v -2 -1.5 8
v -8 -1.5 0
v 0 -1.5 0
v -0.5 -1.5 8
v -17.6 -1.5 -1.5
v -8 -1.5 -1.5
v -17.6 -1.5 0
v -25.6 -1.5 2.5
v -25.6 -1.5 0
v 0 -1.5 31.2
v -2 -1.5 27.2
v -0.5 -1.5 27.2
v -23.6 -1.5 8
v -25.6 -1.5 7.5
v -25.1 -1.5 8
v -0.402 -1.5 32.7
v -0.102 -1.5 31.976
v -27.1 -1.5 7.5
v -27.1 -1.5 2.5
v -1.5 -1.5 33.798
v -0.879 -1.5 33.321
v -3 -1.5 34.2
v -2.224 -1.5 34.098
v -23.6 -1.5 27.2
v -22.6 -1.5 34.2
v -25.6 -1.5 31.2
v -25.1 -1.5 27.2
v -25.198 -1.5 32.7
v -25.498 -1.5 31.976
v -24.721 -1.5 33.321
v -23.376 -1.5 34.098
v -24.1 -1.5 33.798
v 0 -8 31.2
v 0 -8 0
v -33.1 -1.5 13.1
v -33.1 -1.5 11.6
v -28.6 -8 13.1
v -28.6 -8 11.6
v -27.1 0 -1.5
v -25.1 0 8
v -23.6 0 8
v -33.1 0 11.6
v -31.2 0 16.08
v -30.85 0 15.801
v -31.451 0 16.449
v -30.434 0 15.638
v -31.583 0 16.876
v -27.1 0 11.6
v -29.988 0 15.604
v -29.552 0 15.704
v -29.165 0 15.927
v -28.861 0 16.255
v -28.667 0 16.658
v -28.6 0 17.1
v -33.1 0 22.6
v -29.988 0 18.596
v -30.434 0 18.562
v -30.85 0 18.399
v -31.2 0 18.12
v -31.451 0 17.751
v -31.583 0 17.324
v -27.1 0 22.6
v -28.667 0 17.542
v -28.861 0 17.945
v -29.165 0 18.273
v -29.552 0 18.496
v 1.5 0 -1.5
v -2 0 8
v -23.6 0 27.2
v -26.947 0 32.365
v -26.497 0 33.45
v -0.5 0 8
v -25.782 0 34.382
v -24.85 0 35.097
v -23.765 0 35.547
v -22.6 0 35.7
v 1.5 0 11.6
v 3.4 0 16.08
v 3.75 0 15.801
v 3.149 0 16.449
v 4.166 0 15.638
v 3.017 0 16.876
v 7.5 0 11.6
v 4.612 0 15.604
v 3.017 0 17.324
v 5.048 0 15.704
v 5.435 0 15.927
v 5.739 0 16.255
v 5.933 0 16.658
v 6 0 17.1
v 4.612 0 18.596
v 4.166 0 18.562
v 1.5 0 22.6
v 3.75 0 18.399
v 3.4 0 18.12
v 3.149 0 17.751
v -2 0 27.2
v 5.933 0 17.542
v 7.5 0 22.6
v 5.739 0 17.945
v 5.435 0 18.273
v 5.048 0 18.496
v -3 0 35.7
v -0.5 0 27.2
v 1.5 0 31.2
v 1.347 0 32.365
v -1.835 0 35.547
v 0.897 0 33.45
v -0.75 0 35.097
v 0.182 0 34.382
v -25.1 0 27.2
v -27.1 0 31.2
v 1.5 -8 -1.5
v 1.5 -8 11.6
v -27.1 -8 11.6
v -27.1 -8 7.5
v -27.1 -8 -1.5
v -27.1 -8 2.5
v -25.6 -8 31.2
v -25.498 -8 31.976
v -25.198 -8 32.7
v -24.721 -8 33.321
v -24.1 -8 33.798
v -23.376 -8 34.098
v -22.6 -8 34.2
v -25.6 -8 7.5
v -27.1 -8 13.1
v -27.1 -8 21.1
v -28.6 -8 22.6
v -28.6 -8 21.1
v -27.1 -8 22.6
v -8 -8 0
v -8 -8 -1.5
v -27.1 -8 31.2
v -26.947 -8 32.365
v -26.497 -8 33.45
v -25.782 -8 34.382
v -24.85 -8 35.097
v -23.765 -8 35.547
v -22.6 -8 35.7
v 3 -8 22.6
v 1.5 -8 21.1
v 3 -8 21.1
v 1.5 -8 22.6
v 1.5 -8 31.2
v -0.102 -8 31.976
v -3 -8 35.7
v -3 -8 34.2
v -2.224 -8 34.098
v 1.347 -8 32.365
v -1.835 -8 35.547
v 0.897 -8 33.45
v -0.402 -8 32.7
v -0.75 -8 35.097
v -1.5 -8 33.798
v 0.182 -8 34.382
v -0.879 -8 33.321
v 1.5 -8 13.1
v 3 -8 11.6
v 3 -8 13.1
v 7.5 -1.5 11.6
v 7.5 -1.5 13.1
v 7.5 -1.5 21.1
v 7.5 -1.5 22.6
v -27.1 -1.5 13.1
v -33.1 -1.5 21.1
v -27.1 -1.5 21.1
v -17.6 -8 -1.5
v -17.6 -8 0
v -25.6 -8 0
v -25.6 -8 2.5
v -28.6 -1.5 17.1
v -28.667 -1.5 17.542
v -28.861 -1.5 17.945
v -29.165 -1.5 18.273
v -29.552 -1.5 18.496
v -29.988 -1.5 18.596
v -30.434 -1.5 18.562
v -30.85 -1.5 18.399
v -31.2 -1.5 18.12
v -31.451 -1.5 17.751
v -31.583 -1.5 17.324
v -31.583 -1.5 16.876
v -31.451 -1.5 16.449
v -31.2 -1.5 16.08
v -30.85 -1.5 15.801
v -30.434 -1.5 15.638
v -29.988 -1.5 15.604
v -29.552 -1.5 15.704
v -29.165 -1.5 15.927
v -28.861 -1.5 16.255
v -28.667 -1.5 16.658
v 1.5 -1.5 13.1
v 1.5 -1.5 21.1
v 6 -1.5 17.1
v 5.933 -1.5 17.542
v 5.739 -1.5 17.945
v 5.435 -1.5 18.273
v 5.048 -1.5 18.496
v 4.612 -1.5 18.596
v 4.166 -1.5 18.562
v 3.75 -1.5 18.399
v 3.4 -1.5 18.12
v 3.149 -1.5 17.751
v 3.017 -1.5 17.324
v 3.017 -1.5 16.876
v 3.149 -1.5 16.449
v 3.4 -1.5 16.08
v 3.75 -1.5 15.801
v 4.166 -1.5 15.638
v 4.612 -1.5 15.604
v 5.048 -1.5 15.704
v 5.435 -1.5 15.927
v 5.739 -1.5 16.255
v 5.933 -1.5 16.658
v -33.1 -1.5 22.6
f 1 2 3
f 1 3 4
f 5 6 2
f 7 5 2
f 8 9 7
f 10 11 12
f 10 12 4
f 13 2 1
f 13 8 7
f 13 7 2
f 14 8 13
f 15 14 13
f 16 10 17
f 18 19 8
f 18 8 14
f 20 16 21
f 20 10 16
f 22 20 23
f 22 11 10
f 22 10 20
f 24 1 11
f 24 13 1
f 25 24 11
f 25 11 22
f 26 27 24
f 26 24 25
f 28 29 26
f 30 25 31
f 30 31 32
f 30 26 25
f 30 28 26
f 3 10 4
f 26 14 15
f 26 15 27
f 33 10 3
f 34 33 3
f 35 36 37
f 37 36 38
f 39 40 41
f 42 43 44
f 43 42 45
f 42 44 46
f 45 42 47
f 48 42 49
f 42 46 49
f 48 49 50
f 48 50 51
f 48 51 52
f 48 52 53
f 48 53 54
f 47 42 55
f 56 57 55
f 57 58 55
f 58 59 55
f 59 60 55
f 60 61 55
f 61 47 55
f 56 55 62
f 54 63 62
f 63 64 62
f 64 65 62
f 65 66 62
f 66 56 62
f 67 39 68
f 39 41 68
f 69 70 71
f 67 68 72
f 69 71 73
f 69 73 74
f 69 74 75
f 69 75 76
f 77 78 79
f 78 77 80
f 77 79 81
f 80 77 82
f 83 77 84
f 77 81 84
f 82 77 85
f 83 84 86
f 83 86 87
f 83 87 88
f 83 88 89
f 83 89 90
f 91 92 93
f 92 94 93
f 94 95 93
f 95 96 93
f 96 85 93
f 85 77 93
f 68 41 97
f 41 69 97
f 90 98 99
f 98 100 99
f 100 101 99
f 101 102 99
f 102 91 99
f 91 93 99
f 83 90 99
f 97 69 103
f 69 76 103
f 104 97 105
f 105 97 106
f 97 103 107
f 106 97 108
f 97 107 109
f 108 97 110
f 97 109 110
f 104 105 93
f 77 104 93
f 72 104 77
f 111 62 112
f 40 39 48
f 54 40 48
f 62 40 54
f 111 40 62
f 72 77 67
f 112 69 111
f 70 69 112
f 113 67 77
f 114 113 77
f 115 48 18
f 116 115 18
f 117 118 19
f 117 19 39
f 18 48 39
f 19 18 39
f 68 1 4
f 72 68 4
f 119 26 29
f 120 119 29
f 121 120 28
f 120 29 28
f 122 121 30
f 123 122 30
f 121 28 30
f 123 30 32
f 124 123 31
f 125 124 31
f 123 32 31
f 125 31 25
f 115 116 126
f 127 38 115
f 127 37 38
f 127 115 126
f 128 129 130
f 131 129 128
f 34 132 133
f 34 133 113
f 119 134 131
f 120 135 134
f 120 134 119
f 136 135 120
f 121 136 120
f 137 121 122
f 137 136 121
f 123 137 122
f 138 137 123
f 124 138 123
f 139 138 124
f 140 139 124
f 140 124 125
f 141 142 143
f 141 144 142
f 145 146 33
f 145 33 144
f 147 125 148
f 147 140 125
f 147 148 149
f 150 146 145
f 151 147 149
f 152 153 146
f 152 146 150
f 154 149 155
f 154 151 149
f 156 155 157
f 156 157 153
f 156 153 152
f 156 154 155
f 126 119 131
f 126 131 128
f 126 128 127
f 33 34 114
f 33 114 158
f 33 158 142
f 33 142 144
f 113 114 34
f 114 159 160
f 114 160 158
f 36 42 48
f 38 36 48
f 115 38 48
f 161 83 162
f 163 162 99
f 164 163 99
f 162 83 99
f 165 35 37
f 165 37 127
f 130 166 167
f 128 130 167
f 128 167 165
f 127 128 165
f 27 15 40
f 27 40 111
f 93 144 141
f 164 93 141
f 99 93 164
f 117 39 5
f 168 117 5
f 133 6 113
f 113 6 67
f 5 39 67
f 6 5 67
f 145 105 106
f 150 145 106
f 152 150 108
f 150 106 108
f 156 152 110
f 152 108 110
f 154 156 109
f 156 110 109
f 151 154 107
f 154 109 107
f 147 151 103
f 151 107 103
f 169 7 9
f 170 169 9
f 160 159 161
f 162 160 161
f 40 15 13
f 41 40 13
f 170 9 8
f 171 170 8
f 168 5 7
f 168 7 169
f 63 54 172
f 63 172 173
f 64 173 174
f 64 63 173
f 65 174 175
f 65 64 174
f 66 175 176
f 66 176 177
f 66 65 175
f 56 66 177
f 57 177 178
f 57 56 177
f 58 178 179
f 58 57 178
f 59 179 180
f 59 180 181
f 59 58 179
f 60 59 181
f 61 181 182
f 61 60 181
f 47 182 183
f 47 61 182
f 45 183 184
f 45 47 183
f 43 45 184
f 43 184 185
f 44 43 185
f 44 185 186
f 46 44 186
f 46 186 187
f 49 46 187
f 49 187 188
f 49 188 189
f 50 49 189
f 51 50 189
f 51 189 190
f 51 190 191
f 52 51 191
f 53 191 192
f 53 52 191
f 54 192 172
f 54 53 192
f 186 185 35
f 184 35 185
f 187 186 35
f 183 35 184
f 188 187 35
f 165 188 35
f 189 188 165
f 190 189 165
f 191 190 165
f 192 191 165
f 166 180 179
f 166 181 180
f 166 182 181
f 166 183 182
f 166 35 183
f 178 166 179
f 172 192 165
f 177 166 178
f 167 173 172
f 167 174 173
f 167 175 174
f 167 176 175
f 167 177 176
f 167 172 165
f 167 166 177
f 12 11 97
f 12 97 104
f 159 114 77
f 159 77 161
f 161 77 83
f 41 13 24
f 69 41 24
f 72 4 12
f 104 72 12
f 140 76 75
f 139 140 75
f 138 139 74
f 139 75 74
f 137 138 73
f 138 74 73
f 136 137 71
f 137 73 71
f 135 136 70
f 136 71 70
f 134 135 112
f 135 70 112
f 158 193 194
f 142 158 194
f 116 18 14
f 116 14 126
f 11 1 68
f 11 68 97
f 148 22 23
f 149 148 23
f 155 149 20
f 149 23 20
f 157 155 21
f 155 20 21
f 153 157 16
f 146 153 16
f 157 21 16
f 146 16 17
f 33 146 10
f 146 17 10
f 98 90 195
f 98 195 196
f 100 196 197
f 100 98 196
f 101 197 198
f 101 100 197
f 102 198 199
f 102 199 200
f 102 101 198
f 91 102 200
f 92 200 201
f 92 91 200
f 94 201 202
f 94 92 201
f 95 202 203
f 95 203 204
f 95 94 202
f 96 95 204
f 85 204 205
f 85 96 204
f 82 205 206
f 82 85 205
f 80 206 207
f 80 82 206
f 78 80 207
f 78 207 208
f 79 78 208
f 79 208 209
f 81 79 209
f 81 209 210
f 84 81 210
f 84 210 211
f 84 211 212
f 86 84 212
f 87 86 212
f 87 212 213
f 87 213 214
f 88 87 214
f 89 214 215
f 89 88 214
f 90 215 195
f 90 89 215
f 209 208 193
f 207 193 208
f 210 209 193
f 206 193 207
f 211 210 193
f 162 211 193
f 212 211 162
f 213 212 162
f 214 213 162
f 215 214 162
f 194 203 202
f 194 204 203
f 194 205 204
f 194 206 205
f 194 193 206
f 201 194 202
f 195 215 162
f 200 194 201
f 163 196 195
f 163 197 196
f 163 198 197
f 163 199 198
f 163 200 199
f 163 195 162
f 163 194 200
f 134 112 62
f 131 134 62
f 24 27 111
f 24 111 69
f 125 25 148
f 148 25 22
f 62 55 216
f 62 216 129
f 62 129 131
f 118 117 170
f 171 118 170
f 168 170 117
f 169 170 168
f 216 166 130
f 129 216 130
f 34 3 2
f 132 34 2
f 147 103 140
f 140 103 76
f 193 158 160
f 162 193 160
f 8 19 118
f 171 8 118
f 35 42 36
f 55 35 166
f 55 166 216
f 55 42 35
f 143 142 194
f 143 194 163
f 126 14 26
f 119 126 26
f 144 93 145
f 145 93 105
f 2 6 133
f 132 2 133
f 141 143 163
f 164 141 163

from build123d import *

# Parameters (mm, degrees)
F0_W      = 6
F0_H      = 1.5
F1_DEPTH  = 8
F0_H_2    = 8
F0_R      = 1.5
F2_DEPTH  = 1.5
F4_DEPTH  = 25
F6_DEPTH  = 25
F7_W      = 9.6
F7_H      = 6.5
F8_DEPTH  = 1.5
F9_W      = 6.5
F9_H      = 5
F10_DEPTH = 1.5
F11_W     = 1.5
F11_H     = 19.2
F12_DEPTH = 1.5


# Not quite as in the source:
# - a feature names something its author has since deleted; it is built from what else it names


with BuildPart() as f1:
    # F0 (on Front) → F1 (new body)
    with BuildSketch(Plane.XZ):
        with Locations((4.5, 12.35)):
            Rectangle(F0_W, F0_H)
        with Locations((4.5, 21.85)):
            Rectangle(F0_W, F0_H)
        with Locations((-30.1, 12.35)):
            Rectangle(F0_W, F0_H)
        with Locations((-30.1, 21.85)):
            Rectangle(F0_W, F0_H)
        with BuildLine():
            Line((-27.1, 11.6), (-27.1, -1.5))
            Line((-27.1, -1.5), (1.5, -1.5))
            Line((1.5, -1.5), (1.5, 11.6))
            Line((1.5, 11.6), (1.5, 13.1))
            Line((1.5, 13.1), (1.5, 21.1))
            Line((1.5, 21.1), (1.5, 22.6))
            Line((1.5, 22.6), (1.5, 31.2))
            ThreePointArc((1.5, 31.2), (0.1819805153, 34.3819805153), (-3, 35.7))
            Line((-3, 35.7), (-22.6, 35.7))
            ThreePointArc((-22.6, 35.7), (-25.7819805153, 34.3819805153), (-27.1, 31.2))
            Line((-27.1, 31.2), (-27.1, 22.6))
            Line((-27.1, 22.6), (-27.1, 21.1))
            Line((-27.1, 21.1), (-27.1, 13.1))
            Line((-27.1, 13.1), (-27.1, 11.6))
        make_face()
        with BuildLine():
            ThreePointArc((-25.6, 31.2), (-24.7213203436, 33.3213203436), (-22.6, 34.2))
            Line((-22.6, 34.2), (-3, 34.2))
            ThreePointArc((-3, 34.2), (-0.8786796564, 33.3213203436), (0, 31.2))
            Line((0, 31.2), (0, 0))
            Line((0, 0), (-25.6, 0))
            Line((-25.6, 0), (-25.6, 31.2))
        make_face(mode=Mode.SUBTRACT)
    extrude(amount=F1_DEPTH)

    # F0 (on Front) → F2 (join)
    with BuildSketch(Plane.XZ):
        with Locations((4.5, 17.1)):
            Rectangle(F0_W, F0_H_2)
        with Locations((4.5, 17.1)):
            Circle(F0_R, mode=Mode.SUBTRACT)
        with Locations((-30.1, 17.1)):
            Rectangle(F0_W, F0_H_2)
        with Locations((-30.1, 17.1)):
            Circle(F0_R, mode=Mode.SUBTRACT)
        with BuildLine():
            Line((-3, 34.2), (-22.6, 34.2))
            ThreePointArc((-22.6, 34.2), (-24.7213203436, 33.3213203436), (-25.6, 31.2))
            Line((-25.6, 31.2), (-25.6, 0))
            Line((-25.6, 0), (0, 0))
            Line((0, 0), (0, 31.2))
            ThreePointArc((0, 31.2), (-0.8786796564, 33.3213203436), (-3, 34.2))
        make_face()
    extrude(amount=F2_DEPTH)

    # F3 (on face) → F4 (cut)
    with BuildSketch(Plane(origin=(0, 0, 11.6), x_dir=(1, 0, 0), z_dir=(0, 0, -1))):
        Polygon((7.5, 8), (3, 8), (7.5, 1.5), align=None)
    extrude(amount=-F4_DEPTH, mode=Mode.SUBTRACT)

    # F5 (on face) → F6 (cut)
    with BuildSketch(Plane(origin=(0, 0, 11.6), x_dir=(1, 0, 0), z_dir=(0, 0, -1))):
        Polygon((-33.1, 1.5), (-28.6, 8), (-33.1, 8), align=None)
    extrude(amount=-F6_DEPTH, mode=Mode.SUBTRACT)

    # F7 (on face) → F8 (cut, through all)
    with BuildSketch(Plane(origin=(0, 0, -1.5), x_dir=(1, 0, 0), z_dir=(0, 0, -1))):
        with Locations((-12.8, 4.75)):
            Rectangle(F7_W, F7_H)
    extrude(amount=-F8_DEPTH, mode=Mode.SUBTRACT)

    # F9 (on face) → F10 (cut, through all)
    with BuildSketch(Plane(origin=(-27.1, 0, 0), x_dir=(0, -1, 0), z_dir=(-1, 0, 0))):
        with Locations((4.75, 5)):
            Rectangle(F9_W, F9_H)
    extrude(amount=-F10_DEPTH, mode=Mode.SUBTRACT)

    # F11 (on face) → F12 (cut, through all)
    with BuildSketch(Plane.XZ.offset(1.5)):
        with Locations((-24.35, 17.6)):
            Rectangle(F11_W, F11_H)
        with Locations((-1.25, 17.6)):
            Rectangle(F11_W, F11_H)
    extrude(amount=-F12_DEPTH, mode=Mode.SUBTRACT)


solid = f1.part
